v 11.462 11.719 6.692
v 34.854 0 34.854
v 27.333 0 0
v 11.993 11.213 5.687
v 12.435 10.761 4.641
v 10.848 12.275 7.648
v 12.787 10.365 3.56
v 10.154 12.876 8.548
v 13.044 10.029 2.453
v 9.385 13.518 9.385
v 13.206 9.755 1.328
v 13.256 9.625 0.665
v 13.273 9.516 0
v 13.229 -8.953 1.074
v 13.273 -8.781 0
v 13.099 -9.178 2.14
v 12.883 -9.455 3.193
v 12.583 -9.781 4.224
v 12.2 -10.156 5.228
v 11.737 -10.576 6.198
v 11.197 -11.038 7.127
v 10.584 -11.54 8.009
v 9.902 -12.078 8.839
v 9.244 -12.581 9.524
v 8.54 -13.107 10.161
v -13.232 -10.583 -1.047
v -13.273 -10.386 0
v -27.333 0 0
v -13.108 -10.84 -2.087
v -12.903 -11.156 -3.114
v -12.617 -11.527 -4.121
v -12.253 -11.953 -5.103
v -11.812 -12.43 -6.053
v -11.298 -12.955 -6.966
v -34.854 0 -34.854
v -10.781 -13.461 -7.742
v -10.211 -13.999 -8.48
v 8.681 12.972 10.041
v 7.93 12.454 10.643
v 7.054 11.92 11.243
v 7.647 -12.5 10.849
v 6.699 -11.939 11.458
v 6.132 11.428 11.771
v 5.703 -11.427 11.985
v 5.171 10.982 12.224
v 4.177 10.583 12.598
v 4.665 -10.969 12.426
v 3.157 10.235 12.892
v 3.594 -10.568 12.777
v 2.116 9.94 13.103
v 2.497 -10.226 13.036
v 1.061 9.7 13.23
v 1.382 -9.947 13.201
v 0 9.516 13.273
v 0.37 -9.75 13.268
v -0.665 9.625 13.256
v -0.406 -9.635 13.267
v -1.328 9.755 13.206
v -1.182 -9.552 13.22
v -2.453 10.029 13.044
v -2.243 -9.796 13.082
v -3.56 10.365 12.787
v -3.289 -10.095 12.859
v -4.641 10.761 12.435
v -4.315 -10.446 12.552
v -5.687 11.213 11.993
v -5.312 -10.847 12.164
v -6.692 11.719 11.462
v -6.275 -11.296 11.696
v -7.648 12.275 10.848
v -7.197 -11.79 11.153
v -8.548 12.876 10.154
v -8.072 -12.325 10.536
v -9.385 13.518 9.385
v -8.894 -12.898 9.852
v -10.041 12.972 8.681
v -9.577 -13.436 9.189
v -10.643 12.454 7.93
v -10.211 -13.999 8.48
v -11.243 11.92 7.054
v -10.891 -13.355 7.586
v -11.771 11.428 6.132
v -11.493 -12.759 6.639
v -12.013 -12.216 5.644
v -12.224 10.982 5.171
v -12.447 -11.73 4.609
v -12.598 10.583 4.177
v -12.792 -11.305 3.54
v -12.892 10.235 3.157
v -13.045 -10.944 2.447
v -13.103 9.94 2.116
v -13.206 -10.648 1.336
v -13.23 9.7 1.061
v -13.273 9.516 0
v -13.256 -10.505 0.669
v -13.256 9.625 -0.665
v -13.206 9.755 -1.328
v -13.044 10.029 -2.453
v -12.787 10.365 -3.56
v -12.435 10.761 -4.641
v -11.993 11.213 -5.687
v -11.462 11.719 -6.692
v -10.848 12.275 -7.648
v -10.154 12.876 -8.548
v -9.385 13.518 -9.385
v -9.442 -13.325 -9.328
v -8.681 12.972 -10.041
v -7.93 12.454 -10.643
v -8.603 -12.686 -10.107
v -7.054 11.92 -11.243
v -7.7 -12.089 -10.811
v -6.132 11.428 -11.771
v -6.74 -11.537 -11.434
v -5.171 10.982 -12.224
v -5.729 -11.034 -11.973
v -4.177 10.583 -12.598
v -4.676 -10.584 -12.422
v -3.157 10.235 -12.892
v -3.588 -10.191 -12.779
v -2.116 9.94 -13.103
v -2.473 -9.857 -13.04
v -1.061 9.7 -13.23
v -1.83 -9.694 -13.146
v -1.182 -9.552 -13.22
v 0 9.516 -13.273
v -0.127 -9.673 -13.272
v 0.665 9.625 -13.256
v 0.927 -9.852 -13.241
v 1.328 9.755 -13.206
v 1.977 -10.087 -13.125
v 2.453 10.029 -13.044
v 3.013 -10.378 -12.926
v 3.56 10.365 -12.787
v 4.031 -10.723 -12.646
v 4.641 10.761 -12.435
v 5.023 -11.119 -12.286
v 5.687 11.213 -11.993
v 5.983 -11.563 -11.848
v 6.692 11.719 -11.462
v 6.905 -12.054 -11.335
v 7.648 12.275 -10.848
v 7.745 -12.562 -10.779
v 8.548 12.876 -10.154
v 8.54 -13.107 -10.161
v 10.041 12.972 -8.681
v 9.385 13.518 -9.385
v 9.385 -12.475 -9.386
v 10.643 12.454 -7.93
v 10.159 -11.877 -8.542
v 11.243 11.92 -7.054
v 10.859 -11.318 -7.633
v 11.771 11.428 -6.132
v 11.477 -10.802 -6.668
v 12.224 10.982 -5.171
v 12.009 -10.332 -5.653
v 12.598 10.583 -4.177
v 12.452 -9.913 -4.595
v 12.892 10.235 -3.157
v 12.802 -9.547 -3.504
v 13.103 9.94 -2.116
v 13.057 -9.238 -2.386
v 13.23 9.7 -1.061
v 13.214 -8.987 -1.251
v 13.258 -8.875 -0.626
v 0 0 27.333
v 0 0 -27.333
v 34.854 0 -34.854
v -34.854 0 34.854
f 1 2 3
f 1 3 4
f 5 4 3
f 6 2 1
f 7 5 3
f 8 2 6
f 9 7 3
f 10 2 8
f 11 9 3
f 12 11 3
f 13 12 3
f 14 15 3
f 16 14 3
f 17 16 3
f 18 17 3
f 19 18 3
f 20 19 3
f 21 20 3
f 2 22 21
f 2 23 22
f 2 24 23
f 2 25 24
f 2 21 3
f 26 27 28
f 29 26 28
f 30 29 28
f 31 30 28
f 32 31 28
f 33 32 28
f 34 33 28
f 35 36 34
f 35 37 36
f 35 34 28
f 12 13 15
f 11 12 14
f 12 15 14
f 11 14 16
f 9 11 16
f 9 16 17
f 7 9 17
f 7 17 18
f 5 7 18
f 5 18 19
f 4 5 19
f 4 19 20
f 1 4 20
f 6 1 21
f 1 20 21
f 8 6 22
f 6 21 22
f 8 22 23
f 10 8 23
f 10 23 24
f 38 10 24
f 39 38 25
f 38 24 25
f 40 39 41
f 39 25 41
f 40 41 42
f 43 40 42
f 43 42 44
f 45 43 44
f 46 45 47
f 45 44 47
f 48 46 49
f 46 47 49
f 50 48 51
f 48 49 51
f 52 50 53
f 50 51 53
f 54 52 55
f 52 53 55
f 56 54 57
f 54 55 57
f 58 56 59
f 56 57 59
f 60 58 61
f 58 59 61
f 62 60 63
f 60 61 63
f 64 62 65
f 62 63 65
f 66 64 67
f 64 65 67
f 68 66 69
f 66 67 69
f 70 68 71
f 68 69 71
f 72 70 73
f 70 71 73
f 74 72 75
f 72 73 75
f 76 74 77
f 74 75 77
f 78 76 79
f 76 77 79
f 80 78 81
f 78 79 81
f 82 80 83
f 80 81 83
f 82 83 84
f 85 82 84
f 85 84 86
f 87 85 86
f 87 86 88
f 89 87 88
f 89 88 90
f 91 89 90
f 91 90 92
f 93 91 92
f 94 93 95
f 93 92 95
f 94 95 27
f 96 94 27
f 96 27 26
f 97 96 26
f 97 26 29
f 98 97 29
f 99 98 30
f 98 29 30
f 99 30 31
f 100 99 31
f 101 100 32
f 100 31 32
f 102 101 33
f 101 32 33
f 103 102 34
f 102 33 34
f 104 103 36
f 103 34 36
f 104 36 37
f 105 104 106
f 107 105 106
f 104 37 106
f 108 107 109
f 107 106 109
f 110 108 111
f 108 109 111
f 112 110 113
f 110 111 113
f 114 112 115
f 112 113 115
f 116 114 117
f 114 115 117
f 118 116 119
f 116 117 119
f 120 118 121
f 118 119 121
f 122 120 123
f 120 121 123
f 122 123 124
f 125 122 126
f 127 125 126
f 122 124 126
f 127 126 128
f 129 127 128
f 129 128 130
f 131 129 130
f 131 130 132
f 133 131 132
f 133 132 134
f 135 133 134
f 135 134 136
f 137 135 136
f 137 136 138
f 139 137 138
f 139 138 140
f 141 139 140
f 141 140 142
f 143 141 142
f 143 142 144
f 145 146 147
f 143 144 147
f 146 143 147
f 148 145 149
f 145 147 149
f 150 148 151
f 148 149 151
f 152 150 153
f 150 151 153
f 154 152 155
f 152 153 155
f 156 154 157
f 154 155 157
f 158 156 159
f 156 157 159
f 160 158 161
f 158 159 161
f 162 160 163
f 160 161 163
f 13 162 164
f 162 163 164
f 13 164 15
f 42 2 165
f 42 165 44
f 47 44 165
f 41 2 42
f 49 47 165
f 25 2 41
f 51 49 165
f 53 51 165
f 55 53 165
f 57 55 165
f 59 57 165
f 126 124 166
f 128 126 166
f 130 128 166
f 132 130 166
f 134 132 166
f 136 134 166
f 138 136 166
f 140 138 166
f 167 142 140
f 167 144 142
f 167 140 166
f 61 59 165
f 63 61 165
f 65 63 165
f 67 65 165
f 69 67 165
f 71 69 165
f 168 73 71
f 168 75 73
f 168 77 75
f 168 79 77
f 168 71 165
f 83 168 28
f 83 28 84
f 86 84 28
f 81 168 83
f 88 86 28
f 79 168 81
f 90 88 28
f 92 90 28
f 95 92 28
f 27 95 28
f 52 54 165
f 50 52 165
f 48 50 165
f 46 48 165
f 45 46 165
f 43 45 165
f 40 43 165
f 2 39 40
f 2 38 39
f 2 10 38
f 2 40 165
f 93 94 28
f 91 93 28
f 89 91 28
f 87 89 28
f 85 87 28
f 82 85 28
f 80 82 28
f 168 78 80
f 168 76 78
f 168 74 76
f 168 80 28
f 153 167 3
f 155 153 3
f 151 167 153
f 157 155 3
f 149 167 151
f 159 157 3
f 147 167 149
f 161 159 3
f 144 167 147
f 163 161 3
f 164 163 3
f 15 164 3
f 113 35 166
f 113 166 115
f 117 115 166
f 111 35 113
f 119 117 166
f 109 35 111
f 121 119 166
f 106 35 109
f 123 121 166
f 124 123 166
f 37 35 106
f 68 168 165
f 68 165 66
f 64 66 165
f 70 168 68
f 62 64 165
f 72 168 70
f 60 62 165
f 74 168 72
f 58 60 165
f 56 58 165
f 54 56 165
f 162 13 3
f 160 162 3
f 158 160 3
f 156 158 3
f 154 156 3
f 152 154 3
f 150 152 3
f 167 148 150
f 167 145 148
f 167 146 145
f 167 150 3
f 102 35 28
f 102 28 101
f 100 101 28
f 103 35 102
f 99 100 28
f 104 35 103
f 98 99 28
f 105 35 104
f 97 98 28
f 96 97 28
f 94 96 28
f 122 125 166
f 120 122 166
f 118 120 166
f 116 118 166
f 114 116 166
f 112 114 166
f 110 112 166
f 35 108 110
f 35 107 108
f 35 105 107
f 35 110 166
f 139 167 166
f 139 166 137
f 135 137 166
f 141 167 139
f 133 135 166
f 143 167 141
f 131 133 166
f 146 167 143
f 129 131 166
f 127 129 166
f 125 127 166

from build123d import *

# Parameters (mm, degrees)
F7_R     = 13.2729716618
F8_DEPTH = 29.2


with BuildPart() as f3:
    # F0 (on Front) → F3 section 0
    with BuildSketch(Plane.XZ, mode=Mode.PRIVATE) as f3_s0:
        Polygon((-27.3326151073, 0), (-34.8543561995, -34.8543561995), (0, -27.3326151073), (34.8543561995, -34.8543561995), (27.3326151073, 0), (34.8543561995, 34.8543561995), (0, 27.3326151073), (-34.8543561995, 34.8543561995), align=None)
    loft([f3_s0.sketch, Vertex(-2.2883485071, -18.5, 0)])

    # F3_face (on face) → F6 section 0
    with BuildSketch(Plane(origin=(0, 0, 0), x_dir=(-1, 0, 0), z_dir=(0, 1, 0)), mode=Mode.PRIVATE) as f6_s0:
        Polygon((27.3326151073, 0), (34.8543561995, 34.8543561995), (0, 27.3326151073), (-34.8543561995, 34.8543561995), (-27.3326151073, 0), (-34.8543561995, -34.8543561995), (0, -27.3326151073), (34.8543561995, -34.8543561995), align=None)
    loft([f6_s0.sketch, Vertex(0, 18.5, 0)])

    # F7 (on Front) → F8 (cut, symmetric)
    with BuildSketch(Plane.XZ):
        Circle(F7_R)
    extrude(amount=F8_DEPTH, both=True, mode=Mode.SUBTRACT)


solid = f3.part
